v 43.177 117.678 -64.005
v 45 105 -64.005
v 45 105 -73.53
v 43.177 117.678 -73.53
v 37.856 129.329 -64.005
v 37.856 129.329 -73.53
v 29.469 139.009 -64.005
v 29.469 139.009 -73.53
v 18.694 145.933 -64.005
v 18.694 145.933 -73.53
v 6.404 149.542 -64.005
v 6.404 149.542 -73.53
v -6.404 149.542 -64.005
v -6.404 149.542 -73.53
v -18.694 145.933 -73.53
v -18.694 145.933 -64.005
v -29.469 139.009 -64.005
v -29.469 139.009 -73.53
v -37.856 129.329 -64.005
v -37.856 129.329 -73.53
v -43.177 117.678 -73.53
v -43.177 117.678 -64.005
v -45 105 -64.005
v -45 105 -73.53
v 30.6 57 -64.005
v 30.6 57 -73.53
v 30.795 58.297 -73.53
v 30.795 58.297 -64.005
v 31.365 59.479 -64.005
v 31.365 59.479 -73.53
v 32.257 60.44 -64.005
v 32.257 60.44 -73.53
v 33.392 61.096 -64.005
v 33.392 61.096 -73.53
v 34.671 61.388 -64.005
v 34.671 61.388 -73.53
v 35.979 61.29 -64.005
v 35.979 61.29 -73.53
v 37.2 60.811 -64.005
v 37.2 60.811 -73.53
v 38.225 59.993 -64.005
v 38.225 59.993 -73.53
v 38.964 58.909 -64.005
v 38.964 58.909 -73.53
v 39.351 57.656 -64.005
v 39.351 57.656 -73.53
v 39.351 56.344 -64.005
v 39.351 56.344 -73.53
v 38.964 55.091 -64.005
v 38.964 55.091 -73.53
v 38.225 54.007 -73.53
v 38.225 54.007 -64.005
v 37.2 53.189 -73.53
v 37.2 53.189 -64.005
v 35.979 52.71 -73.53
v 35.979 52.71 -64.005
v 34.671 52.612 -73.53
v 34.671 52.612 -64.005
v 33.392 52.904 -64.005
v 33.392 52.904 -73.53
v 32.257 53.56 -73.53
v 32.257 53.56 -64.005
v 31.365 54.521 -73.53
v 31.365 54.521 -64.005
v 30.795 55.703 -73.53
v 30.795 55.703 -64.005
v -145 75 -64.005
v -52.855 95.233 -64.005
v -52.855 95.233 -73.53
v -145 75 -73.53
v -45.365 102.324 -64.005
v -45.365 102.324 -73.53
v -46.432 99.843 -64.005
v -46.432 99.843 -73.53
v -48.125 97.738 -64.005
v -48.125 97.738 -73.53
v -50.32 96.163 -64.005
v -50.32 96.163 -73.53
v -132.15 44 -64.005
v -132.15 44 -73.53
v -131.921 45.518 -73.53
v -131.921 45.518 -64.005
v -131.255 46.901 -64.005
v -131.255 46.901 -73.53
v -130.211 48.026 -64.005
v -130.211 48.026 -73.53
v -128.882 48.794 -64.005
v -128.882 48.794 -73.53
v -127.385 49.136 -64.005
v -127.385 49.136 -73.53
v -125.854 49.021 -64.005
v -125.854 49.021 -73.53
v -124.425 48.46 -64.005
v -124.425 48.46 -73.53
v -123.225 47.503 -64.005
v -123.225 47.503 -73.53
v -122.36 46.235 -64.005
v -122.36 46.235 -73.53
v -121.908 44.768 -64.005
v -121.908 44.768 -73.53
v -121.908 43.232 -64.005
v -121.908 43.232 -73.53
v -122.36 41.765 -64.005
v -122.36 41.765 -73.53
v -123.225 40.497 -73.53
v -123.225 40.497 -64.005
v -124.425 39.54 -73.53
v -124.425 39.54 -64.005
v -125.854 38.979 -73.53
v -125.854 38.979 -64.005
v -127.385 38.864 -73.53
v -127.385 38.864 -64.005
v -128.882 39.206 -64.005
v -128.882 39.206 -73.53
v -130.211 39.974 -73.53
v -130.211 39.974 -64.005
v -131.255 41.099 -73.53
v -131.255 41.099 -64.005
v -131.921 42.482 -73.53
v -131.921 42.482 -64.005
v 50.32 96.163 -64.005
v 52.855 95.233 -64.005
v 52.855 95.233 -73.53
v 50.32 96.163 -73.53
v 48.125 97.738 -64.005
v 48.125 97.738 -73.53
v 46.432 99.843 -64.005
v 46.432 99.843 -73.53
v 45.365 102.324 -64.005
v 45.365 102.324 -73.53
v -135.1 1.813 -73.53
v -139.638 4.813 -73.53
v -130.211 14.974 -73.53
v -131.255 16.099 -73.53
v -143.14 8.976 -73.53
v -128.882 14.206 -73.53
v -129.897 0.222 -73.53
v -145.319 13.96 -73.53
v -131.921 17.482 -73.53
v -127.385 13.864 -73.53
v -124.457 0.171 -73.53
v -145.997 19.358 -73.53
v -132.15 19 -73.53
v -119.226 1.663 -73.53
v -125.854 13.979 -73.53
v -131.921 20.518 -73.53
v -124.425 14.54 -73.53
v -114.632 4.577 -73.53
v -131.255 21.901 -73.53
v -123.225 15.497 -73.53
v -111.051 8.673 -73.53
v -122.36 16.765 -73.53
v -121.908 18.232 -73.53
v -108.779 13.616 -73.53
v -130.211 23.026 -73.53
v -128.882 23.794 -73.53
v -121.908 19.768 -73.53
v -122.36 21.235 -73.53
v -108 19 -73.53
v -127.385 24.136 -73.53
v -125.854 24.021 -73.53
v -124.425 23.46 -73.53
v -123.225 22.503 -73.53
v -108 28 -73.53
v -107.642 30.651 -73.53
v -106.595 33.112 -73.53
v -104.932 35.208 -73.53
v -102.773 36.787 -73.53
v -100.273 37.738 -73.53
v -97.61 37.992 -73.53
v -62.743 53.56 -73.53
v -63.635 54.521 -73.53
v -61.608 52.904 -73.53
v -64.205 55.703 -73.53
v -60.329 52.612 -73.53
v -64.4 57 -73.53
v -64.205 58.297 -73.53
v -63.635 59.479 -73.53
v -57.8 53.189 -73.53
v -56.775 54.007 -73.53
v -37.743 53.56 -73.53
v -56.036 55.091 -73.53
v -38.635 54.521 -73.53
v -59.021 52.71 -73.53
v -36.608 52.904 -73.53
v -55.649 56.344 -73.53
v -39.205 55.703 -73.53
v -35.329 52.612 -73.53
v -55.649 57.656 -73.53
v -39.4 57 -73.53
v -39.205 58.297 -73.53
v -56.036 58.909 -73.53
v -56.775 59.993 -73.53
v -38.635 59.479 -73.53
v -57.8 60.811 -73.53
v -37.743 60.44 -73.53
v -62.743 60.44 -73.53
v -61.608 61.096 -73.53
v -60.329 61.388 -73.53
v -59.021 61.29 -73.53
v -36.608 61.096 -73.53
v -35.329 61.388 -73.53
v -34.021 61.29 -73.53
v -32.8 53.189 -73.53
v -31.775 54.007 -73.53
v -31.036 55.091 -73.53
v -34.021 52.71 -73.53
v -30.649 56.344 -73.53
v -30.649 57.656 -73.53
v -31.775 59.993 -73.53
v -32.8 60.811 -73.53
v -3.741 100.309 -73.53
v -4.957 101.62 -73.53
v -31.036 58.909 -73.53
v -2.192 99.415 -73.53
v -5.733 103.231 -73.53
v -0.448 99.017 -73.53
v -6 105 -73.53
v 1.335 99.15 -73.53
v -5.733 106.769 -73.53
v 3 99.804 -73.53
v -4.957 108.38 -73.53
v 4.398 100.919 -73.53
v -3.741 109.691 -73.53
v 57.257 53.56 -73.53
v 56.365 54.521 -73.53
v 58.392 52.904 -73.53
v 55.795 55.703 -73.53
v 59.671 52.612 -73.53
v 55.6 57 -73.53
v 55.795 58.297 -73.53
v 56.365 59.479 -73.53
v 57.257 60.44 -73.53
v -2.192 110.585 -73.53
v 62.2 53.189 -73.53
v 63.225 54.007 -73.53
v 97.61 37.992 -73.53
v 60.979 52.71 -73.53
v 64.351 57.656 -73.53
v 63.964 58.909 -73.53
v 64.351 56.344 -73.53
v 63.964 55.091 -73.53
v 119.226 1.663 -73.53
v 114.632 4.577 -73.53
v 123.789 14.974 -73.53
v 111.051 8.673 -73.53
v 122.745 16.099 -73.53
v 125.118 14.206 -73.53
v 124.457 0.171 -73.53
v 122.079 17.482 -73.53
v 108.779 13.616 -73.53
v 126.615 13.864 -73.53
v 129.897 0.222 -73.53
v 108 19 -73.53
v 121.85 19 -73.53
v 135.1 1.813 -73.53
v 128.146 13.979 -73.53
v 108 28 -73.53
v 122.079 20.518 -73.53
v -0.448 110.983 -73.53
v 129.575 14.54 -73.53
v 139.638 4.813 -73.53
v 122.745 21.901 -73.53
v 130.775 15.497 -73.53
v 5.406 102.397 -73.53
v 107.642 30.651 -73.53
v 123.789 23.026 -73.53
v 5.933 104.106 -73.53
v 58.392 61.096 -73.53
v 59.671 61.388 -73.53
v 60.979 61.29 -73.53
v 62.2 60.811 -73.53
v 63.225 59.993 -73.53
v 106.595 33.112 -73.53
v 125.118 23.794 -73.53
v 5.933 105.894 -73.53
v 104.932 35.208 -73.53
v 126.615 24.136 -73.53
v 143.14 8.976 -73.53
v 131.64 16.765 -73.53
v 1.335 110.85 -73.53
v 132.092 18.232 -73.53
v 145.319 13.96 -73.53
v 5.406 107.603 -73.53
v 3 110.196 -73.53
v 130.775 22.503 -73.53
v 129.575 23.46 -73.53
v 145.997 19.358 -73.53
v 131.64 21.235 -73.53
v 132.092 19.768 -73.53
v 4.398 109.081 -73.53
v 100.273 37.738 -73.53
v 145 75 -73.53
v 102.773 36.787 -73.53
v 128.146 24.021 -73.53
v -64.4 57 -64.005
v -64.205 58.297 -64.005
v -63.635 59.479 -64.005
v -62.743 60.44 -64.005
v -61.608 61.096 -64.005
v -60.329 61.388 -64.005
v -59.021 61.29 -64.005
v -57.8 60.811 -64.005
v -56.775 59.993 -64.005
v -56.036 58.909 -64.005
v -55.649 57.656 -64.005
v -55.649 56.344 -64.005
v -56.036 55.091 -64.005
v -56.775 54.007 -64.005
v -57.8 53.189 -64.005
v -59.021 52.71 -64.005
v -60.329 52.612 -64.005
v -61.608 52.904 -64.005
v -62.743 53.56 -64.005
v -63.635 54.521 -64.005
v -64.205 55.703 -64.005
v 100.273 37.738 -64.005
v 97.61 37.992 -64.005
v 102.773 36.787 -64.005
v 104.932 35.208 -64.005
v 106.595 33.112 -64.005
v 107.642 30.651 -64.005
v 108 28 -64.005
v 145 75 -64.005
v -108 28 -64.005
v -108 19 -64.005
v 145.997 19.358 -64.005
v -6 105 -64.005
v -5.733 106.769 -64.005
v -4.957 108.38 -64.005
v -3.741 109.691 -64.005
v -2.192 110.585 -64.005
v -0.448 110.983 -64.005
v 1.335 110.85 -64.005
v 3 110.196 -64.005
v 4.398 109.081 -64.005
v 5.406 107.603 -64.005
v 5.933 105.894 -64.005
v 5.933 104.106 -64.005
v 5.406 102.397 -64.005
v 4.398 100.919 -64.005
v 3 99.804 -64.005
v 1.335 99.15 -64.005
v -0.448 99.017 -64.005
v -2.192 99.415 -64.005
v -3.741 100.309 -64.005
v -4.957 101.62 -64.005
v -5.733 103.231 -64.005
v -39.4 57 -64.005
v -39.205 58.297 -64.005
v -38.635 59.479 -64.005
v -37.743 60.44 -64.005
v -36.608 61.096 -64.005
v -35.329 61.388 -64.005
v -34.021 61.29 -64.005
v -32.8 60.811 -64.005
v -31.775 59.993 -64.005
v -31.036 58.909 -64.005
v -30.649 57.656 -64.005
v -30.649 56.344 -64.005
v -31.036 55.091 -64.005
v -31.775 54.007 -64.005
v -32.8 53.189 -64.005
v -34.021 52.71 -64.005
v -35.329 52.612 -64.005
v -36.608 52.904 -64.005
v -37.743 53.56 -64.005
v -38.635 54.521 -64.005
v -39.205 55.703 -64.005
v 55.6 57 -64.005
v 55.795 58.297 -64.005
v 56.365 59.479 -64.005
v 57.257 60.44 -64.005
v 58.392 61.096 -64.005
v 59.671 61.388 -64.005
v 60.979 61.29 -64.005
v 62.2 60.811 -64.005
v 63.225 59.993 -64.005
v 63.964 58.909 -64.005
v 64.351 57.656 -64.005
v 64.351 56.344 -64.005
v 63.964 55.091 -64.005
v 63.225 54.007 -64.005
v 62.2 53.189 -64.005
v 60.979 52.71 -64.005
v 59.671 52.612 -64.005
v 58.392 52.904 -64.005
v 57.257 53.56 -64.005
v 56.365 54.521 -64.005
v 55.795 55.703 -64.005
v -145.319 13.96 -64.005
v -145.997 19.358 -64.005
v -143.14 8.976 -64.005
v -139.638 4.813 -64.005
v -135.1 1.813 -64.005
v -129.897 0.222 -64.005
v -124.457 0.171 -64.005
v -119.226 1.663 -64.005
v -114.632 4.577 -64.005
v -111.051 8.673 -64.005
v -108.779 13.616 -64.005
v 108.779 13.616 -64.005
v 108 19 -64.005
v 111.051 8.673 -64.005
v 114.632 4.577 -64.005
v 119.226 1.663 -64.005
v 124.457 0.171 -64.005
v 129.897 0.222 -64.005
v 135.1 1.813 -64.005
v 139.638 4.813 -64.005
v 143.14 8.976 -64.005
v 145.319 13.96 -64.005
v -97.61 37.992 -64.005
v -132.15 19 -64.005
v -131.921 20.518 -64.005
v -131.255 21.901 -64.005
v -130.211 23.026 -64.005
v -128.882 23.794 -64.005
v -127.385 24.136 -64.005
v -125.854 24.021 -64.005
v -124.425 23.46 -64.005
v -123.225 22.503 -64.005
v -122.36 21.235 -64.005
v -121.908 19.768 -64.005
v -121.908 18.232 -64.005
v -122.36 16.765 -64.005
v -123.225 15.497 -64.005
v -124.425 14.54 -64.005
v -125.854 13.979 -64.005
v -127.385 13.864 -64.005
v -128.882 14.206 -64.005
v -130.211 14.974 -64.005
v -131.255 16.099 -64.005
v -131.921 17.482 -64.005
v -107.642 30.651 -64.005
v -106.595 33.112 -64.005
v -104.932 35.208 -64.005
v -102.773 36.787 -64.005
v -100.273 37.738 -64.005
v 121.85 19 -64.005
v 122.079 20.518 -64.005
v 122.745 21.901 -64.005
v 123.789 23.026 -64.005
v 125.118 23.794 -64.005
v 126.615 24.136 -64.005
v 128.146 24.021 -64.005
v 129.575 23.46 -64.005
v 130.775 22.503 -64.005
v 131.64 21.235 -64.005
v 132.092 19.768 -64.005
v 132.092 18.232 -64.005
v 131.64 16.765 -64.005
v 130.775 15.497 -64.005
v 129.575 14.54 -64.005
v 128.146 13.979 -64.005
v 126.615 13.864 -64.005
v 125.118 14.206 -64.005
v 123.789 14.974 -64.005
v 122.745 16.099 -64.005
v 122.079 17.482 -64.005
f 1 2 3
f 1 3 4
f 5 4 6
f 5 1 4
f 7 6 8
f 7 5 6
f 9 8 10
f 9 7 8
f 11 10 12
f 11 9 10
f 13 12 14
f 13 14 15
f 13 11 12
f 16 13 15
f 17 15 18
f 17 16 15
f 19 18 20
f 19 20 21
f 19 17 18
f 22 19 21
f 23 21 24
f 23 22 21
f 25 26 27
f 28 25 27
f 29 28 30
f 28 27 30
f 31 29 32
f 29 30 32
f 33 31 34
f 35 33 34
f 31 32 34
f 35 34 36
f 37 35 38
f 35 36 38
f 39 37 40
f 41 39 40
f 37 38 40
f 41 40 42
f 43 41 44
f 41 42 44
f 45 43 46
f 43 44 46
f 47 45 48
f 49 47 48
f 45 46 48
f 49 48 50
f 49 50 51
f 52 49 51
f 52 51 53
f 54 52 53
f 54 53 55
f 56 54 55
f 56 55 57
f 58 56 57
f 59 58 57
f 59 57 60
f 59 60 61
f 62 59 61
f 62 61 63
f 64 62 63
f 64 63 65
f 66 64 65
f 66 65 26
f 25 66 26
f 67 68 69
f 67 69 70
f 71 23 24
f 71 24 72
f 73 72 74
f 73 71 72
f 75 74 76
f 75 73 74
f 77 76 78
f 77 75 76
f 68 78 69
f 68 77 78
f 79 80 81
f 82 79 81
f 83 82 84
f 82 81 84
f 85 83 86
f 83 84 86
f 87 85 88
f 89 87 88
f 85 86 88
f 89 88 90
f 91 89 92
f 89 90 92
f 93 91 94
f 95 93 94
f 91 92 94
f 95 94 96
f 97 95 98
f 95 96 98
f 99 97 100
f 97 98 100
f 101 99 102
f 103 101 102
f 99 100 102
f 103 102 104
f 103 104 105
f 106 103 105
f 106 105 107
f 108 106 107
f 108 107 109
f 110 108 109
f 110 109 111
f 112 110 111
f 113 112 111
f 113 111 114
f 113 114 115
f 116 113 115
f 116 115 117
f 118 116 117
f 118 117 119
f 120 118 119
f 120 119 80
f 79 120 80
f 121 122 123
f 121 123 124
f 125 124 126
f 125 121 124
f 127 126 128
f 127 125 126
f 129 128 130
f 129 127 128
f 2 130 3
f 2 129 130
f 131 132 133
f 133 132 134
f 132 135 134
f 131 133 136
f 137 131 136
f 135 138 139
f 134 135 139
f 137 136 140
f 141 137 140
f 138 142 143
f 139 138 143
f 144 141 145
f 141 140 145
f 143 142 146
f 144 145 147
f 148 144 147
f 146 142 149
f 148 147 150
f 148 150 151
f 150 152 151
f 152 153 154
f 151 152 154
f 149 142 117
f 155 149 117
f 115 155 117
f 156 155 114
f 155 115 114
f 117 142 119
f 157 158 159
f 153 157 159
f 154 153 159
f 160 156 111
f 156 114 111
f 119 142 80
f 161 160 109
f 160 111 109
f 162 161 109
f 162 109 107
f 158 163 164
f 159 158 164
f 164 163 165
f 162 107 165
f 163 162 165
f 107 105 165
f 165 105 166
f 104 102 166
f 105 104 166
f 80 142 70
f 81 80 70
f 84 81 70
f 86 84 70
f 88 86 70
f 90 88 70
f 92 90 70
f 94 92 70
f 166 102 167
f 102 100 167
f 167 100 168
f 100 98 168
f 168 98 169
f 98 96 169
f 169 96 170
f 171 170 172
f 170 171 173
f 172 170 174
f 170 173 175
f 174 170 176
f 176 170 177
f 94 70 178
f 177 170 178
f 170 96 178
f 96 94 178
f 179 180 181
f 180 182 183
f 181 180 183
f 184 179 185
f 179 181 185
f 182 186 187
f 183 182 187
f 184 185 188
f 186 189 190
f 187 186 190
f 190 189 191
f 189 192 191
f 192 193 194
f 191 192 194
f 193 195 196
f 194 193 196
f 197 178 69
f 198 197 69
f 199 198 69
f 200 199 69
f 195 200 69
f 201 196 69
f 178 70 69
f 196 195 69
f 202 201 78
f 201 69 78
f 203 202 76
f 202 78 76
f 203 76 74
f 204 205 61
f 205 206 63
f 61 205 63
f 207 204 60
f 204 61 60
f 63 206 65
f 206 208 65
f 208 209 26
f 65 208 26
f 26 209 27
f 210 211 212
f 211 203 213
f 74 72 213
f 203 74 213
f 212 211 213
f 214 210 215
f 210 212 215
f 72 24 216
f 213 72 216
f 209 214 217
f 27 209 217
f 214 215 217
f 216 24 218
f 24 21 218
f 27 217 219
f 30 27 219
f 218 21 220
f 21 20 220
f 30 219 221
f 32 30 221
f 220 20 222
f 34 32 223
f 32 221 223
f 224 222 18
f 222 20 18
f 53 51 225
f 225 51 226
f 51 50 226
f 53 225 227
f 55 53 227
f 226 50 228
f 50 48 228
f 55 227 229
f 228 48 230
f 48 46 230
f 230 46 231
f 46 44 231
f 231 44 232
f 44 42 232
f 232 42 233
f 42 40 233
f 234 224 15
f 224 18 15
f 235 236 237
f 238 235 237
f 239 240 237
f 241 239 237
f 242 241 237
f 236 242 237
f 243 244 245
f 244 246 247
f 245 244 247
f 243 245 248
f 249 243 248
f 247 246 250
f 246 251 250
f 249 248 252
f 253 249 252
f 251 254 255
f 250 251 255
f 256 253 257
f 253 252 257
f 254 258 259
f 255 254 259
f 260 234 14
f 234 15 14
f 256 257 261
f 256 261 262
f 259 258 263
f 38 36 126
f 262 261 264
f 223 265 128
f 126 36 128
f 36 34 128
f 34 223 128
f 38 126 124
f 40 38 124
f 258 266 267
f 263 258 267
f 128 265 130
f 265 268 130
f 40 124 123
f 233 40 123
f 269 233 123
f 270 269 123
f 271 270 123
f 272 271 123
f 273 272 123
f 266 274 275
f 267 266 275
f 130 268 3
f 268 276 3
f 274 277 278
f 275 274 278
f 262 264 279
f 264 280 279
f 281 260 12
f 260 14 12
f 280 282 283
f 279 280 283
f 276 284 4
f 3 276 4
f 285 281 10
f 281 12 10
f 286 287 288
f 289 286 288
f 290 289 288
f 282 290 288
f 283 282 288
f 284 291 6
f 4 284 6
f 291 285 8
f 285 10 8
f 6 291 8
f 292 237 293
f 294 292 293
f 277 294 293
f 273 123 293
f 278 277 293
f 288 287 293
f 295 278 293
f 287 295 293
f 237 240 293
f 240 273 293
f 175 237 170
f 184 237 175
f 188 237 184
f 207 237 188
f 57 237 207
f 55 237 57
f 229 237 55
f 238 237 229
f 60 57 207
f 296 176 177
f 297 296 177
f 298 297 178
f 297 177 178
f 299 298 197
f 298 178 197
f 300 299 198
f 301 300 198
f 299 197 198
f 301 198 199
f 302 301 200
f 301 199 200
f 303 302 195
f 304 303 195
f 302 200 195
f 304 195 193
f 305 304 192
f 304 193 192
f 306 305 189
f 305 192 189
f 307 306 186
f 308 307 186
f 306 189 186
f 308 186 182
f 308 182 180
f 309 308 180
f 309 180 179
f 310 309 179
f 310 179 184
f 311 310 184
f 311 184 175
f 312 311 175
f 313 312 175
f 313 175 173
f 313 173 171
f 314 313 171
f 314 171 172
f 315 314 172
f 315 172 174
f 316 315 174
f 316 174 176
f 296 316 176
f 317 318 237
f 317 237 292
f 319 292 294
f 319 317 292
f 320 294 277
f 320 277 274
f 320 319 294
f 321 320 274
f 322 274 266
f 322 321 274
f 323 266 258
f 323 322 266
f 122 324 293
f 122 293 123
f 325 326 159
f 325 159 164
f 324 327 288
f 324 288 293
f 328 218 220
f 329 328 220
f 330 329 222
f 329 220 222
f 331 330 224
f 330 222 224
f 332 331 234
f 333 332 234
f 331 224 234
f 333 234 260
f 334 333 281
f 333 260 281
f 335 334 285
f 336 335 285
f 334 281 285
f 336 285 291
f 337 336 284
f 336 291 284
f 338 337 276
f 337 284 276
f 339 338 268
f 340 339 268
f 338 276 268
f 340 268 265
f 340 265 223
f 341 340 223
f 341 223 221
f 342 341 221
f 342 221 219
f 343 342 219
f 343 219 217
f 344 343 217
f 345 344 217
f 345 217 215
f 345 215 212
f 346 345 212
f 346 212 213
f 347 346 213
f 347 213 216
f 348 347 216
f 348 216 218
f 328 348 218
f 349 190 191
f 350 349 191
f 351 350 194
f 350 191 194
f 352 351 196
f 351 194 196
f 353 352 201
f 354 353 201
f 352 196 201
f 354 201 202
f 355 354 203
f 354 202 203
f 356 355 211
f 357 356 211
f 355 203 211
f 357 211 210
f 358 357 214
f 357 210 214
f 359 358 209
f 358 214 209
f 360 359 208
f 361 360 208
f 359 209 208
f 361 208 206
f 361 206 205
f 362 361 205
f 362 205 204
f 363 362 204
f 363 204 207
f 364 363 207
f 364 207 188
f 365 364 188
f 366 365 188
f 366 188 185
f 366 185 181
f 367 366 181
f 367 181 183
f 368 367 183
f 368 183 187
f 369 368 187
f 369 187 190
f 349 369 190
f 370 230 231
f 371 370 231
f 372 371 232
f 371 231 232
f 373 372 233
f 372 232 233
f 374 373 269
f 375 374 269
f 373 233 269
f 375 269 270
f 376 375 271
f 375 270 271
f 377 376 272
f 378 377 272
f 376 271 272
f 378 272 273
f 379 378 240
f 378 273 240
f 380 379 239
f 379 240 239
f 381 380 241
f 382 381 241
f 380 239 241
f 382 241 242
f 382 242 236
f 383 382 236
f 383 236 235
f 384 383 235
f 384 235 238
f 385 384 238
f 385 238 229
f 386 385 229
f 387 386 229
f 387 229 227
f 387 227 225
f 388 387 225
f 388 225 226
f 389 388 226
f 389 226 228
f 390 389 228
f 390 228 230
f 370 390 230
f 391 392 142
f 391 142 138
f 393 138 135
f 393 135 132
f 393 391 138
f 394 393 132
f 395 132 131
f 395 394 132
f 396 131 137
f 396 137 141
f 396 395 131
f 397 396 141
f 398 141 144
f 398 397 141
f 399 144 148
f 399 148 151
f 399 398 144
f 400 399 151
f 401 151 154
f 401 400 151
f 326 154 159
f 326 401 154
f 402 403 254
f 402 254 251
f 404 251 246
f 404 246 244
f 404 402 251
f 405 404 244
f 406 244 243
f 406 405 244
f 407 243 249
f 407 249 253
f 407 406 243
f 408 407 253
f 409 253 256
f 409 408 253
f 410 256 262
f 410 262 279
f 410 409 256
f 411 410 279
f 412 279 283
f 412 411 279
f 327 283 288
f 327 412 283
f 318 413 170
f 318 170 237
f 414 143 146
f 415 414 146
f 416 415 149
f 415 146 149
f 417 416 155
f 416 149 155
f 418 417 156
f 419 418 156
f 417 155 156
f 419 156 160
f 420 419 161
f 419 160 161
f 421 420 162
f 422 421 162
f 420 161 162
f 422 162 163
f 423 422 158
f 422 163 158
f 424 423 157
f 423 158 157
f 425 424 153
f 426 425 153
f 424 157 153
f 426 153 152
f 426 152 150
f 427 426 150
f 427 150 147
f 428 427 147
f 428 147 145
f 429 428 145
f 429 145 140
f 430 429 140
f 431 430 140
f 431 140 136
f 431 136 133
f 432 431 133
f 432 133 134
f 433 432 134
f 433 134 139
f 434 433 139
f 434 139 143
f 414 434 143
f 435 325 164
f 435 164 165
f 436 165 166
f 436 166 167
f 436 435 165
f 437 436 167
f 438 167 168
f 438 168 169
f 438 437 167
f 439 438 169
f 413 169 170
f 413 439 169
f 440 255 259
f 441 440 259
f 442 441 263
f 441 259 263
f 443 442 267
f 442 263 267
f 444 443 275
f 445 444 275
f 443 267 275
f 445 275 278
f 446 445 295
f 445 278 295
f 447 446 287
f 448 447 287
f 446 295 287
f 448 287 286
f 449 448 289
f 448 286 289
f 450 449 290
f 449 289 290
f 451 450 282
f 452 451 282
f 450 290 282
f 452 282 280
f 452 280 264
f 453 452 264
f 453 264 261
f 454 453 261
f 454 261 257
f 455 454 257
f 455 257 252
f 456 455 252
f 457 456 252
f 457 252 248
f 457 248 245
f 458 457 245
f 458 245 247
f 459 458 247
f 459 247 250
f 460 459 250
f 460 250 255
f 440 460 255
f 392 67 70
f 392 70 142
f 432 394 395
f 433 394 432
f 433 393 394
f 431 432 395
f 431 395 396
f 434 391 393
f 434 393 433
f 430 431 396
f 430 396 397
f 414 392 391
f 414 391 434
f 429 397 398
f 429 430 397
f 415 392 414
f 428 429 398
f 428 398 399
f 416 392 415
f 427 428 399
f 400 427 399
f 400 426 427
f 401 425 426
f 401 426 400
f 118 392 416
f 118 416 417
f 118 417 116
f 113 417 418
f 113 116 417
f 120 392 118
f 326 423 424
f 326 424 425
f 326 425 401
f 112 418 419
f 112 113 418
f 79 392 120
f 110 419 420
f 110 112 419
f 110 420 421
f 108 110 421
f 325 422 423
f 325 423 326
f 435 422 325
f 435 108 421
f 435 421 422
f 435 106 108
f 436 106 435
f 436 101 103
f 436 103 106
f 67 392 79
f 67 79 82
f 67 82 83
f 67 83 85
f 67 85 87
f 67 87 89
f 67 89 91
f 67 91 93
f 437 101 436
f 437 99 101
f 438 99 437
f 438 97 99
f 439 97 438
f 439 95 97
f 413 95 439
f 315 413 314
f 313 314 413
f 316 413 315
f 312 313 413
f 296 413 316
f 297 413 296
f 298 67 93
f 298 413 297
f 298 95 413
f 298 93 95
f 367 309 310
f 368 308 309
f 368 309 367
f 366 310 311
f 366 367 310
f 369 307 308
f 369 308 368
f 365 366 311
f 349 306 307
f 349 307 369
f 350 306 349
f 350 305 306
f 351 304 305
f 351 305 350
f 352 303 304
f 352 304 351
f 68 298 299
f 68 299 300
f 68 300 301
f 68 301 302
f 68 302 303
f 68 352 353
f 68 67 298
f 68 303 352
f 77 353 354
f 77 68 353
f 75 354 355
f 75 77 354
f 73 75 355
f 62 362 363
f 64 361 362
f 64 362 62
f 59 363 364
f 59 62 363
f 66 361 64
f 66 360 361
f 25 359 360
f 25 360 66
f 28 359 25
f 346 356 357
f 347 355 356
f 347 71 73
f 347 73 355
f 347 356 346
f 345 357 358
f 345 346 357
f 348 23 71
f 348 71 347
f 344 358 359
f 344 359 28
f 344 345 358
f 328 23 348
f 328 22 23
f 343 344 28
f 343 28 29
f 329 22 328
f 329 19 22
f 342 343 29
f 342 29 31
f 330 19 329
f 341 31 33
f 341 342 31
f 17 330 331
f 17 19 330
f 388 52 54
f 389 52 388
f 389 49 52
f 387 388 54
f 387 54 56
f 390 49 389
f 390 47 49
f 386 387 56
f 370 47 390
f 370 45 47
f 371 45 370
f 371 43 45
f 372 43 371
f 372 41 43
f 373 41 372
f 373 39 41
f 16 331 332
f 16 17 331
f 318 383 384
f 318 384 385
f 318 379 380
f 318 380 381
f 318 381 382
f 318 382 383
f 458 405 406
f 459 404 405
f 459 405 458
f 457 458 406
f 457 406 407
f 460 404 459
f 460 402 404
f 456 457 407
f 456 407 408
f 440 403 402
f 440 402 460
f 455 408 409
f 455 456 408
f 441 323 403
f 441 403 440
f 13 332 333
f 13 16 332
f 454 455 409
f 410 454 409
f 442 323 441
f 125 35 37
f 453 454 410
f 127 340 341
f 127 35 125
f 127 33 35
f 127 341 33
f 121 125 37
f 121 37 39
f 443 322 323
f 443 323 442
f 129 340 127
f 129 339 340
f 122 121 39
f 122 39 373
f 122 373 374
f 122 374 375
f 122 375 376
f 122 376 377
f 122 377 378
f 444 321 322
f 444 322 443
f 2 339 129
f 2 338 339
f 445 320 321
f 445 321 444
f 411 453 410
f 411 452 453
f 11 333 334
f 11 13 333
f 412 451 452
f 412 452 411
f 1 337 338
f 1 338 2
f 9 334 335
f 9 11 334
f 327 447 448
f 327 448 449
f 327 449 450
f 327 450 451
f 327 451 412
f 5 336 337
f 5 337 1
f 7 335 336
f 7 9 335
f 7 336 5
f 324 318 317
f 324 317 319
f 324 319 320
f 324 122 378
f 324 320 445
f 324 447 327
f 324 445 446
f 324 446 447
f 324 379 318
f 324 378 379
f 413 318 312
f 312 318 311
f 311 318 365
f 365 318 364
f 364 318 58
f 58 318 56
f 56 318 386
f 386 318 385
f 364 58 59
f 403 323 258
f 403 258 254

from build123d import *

# Parameters (mm, degrees)
F1_DEPTH = 9.525
F2_D     = 10.3
F3_D     = 8.8
F4_D     = 12
F5_ANGLE = 90


# Not quite as in the source:
# - a length typed as a fraction of an inch, garbled in the dataset ("3 / 203.2 mm" for 3/8 in), is restored
# - a feature names something its author has since deleted; it is built from what else it names


with BuildPart() as f1:
    # F0 (on Front) → F1 (new body)
    with BuildSketch(Plane.XZ):
        with BuildLine():
            ThreePointArc((-108, -36.0045329175), (-104.9318381582, -28.796924455), (-97.6100760503, -26.0121378435))
            Line((-97.6100760503, -26.0121378435), (0, -26.0121378435))
            Line((0, -26.0121378435), (97.6100760503, -26.0121378435))
            ThreePointArc((97.6100760503, -26.0121378435), (104.9318381582, -28.796924455), (108, -36.0045329175))
            Line((108, -36.0045329175), (108, -45.0045329175))
            ThreePointArc((108, -45.0045329175), (127.1790782013, -64.0036889776), (145.9966243156, -44.6463924235))
            Line((145.9966243156, -44.6463924235), (145, 10.9954670825))
            Line((145, 10.9954670825), (52.8553396226, 31.2281526171))
            ThreePointArc((52.8553396226, 31.2281526171), (47.2074842389, 34.7283546603), (45, 40.9954670825))
            ThreePointArc((45, 40.9954670825), (31.8198051534, 72.8152722359), (0, 85.9954670825))
            ThreePointArc((0, 85.9954670825), (-31.8198051534, 72.8152722359), (-45, 40.9954670825))
            ThreePointArc((-45, 40.9954670825), (-47.2074842389, 34.7283546603), (-52.8553396226, 31.2281526171))
            Line((-52.8553396226, 31.2281526171), (-145, 10.9954670825))
            Line((-145, 10.9954670825), (-145.9966243156, -44.6463924235))
            ThreePointArc((-145.9966243156, -44.6463924235), (-127.1790782013, -64.0036889776), (-108, -45.0045329175))
            Line((-108, -45.0045329175), (-108, -36.0045329175))
        make_face()
    extrude(amount=-F1_DEPTH)

    # F2 (through all)
    with Locations(Plane.XZ):
        with Locations((-127, -45.0045329175), (-127, -20.0045329175), (127, -45.0045329175)):
            Hole(F2_D / 2)

    # F3 (through all)
    with Locations(Plane.XZ):
        with Locations((-60, -7.0045329175), (-35, -7.0045329175), (35, -7.0045329175), (60, -7.0045329175)):
            Hole(F3_D / 2)

    # F4 (through all)
    with Locations(Plane.XZ):
        with Locations((0, 40.9954670825)):
            Hole(F4_D / 2)


with BuildPart() as f1_1:
    # F5: moved
    add(f1.part.rotate(Axis((-53.975, 0, -64.0045329175), (-1, 0, 0)), F5_ANGLE))


solid = f1_1.part
